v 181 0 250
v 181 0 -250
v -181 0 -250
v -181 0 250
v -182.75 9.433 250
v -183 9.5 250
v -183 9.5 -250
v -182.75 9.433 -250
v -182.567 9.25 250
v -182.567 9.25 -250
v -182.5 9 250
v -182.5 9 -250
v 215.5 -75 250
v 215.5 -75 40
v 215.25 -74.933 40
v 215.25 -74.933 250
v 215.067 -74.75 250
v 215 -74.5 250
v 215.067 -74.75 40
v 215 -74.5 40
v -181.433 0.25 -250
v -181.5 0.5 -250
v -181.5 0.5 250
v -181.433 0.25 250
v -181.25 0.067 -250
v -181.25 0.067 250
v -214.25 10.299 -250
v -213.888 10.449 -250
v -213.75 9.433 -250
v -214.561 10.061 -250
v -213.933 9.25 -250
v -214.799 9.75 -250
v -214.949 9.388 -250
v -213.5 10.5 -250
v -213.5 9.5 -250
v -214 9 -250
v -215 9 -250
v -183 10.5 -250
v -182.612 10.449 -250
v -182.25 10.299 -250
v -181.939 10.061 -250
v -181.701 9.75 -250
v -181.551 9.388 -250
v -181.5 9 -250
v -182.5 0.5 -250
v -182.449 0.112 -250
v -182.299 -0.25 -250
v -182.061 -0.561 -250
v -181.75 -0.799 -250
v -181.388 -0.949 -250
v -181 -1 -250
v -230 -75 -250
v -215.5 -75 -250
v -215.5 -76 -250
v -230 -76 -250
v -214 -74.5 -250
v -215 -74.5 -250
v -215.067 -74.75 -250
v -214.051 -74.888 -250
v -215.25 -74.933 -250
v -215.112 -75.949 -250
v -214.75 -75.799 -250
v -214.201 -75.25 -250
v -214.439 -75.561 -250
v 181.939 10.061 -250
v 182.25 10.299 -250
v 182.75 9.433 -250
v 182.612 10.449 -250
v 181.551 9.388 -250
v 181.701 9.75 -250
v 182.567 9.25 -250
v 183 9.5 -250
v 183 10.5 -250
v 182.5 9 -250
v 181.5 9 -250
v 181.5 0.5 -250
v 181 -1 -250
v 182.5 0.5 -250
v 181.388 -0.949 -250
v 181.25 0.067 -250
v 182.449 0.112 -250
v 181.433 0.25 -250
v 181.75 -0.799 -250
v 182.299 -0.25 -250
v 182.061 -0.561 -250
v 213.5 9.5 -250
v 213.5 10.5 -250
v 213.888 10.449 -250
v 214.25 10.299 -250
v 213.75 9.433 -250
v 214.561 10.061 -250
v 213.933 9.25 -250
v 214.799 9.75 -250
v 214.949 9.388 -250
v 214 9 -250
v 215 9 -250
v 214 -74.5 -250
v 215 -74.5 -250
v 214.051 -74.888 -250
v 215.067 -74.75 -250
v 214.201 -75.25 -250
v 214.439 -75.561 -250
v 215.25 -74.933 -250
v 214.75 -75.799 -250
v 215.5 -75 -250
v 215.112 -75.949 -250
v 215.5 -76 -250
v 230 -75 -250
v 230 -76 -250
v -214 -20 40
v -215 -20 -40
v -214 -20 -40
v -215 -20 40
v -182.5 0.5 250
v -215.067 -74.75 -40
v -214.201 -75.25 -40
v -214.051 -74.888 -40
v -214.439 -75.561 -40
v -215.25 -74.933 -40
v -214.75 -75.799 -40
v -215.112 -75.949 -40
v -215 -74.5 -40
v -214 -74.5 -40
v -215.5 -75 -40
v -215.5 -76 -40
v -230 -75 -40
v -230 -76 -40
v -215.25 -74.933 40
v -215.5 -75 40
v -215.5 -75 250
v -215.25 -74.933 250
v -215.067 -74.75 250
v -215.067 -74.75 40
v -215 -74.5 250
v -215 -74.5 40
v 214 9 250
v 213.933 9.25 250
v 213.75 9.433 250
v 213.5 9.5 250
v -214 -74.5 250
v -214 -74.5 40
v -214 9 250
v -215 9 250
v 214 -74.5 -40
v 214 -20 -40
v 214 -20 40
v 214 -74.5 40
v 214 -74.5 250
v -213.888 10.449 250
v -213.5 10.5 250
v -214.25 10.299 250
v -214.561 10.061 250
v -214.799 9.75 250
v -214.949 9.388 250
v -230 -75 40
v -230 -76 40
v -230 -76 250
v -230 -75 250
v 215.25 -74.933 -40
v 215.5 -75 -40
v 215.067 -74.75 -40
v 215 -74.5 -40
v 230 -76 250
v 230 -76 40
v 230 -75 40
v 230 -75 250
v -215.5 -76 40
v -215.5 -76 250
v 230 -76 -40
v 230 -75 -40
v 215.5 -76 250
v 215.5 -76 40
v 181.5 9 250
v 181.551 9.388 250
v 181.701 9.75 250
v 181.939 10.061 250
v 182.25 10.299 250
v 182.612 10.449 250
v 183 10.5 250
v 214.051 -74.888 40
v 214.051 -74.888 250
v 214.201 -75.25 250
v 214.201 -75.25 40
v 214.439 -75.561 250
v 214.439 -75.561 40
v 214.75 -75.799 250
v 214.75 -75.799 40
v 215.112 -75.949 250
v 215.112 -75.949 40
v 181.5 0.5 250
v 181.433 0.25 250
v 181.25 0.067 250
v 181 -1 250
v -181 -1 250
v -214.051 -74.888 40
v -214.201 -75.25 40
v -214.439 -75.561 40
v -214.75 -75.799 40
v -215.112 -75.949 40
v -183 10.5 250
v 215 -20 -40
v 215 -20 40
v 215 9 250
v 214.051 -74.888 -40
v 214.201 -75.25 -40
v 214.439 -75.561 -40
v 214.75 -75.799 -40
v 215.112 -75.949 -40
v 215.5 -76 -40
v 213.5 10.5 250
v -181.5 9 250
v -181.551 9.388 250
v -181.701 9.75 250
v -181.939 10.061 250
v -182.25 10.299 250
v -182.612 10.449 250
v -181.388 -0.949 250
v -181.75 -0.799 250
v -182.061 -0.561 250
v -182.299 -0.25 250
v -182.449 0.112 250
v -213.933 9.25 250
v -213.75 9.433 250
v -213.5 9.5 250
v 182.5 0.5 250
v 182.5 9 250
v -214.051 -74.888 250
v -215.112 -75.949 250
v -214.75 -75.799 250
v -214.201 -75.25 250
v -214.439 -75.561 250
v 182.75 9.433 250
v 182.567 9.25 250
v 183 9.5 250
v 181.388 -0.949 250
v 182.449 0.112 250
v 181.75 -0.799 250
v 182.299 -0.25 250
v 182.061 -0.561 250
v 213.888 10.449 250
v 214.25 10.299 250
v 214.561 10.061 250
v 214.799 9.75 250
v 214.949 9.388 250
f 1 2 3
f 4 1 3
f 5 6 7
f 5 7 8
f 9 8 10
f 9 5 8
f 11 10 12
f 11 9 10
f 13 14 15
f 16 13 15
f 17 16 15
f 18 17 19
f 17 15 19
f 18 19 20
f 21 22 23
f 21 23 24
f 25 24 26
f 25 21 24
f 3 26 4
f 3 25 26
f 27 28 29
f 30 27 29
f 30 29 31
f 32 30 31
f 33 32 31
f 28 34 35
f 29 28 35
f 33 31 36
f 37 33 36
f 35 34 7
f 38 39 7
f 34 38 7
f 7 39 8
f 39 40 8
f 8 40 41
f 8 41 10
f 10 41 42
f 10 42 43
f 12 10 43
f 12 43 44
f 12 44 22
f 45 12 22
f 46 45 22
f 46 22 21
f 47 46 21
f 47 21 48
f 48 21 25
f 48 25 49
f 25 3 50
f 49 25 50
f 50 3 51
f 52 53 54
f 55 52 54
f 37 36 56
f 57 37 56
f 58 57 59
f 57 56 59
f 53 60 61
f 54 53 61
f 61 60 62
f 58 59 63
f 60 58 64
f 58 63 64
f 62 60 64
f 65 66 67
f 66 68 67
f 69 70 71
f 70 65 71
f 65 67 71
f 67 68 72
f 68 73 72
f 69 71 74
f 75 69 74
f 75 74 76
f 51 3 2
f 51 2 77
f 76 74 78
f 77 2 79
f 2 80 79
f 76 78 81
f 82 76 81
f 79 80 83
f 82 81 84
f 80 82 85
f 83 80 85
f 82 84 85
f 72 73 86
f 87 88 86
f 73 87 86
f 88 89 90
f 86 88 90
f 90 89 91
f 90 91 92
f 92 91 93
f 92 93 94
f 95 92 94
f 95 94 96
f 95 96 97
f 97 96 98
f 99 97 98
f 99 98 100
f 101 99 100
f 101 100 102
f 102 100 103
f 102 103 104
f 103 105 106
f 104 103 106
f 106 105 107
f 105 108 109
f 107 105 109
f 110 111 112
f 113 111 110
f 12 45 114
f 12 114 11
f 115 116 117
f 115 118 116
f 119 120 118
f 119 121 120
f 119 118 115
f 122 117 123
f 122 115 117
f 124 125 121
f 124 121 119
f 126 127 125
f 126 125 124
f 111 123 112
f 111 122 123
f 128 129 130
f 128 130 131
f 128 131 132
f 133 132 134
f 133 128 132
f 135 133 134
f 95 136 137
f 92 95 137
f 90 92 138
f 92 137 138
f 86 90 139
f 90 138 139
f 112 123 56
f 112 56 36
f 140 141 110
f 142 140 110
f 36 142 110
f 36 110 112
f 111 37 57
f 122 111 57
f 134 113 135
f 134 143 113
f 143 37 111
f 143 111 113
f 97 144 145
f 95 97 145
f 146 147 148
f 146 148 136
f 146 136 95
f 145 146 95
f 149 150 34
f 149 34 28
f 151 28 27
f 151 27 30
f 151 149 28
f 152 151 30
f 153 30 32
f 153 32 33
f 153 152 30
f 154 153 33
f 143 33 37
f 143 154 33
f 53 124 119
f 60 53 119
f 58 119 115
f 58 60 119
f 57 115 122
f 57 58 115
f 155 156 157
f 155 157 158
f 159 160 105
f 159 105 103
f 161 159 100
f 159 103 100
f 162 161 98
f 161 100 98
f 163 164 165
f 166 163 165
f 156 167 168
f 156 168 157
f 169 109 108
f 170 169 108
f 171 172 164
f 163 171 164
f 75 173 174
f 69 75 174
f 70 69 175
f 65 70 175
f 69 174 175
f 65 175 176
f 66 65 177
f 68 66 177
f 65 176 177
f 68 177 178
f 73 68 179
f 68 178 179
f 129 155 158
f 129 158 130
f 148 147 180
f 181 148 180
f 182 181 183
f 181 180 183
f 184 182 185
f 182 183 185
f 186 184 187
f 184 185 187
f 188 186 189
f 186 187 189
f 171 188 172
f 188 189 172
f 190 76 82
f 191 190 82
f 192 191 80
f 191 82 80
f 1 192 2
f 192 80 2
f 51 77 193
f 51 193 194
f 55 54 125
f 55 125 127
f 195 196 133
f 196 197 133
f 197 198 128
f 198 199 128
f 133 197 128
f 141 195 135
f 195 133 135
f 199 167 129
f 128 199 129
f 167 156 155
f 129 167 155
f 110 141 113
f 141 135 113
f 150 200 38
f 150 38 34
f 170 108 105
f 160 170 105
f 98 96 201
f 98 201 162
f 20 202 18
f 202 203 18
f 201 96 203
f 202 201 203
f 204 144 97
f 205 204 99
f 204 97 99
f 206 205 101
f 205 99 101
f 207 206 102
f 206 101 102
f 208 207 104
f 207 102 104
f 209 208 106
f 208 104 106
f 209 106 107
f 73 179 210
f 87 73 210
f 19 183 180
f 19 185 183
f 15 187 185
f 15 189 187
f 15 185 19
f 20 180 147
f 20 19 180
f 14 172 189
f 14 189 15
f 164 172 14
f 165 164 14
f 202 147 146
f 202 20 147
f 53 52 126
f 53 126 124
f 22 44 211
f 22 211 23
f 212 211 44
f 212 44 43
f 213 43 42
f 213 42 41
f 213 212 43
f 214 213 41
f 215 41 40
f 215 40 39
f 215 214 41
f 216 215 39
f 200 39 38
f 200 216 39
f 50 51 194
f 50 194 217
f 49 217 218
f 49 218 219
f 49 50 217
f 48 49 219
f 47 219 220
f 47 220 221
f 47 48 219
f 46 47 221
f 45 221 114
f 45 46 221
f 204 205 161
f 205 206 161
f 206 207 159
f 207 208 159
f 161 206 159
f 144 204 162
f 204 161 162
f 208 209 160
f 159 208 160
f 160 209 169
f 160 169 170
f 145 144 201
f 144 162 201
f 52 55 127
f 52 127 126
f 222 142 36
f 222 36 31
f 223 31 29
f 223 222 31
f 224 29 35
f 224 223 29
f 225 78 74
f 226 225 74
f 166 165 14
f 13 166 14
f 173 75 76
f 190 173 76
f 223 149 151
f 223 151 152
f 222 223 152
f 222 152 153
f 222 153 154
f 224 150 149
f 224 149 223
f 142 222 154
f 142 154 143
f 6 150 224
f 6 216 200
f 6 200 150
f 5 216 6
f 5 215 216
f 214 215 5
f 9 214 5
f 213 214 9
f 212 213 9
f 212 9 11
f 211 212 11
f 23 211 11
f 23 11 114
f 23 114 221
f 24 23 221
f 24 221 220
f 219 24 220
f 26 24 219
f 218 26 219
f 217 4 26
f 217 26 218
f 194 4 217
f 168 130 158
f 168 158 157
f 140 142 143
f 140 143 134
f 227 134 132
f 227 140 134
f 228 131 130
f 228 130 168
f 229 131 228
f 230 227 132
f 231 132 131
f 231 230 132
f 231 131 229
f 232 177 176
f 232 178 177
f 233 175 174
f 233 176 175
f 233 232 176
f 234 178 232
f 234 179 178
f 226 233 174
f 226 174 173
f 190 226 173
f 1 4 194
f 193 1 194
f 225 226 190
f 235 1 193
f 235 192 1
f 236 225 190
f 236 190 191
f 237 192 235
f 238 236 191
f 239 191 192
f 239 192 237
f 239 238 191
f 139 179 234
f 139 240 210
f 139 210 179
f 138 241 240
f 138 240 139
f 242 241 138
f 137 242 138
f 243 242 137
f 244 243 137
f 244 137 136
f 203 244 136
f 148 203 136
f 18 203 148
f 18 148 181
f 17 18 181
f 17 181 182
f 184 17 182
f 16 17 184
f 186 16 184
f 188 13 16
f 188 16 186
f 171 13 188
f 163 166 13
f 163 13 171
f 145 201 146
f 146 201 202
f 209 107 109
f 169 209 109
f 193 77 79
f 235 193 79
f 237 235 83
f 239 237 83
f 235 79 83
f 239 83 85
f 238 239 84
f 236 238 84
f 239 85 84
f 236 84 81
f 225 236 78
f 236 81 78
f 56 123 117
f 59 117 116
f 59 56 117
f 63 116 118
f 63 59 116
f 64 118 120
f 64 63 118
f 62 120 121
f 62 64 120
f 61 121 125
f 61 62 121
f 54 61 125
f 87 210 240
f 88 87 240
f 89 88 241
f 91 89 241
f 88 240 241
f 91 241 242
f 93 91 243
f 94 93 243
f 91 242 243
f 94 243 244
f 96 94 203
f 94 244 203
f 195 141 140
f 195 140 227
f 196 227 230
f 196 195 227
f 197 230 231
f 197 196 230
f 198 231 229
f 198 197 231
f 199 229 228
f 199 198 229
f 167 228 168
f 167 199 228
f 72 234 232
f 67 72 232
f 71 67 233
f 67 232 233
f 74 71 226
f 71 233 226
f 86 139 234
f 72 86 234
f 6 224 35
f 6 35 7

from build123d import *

# Parameters (mm, degrees)
SKETCH_1_W             = 181
SKETCH_1_H             = 500
SM_BASE_FLANGE_1_DEPTH = 1
SM_EDGE_FLANGE_1_DEPTH = 500
SM_EDGE_FLANGE_2_DEPTH = 500
SM_EDGE_FLANGE_3_DEPTH = 500
SM_EDGE_FLANGE_4_DEPTH = 500
SKETCH_18_W            = 80
SKETCH_18_H            = 71.447403799
CUT_EXTRUDE_1_DEPTH    = 100


# Sheet-metal steps are written as plain solids
with BuildPart() as part:
    # Sketch 1 → 基体-法兰1 (new body)
    with BuildSketch(Plane(origin=(0, 0, 0), x_dir=(1, 0, 0), z_dir=(0, 1, 0))):
        with Locations((-90.5, 0)):
            Rectangle(SKETCH_1_W, SKETCH_1_H)
    extrude(amount=-SM_BASE_FLANGE_1_DEPTH)

    # 边线-法兰1 section (across the edge) → 边线-法兰1 (add)
    with BuildSketch(Plane(origin=(-181.5, 0, -250), x_dir=(1, 0, 0), z_dir=(0, 0, 1))):
        with BuildLine():
            Line((-1, 0.5), (-1, 9))
            Line((-1, 9), (0, 9))
            Line((0, 9), (0, 0.5))
            ThreePointArc((0, 0.5), (0.146446609, 0.146446609), (0.5, 0))
            Line((0.5, 0), (0.5, -1))
            ThreePointArc((0.5, -1), (-0.560660172, -0.560660172), (-1, 0.5))
        make_face()
    extrude(amount=SM_EDGE_FLANGE_1_DEPTH)

    # 边线-法兰2 section (across the edge) → 边线-法兰2 (add)
    with BuildSketch(Plane(origin=(-182.5, 9.5, 250), x_dir=(0, -1, 0), z_dir=(0, 0, -1))):
        with BuildLine():
            Line((-1, 0.5), (-1, 31))
            Line((-1, 31), (0, 31))
            Line((0, 31), (0, 0.5))
            ThreePointArc((0, 0.5), (0.146446609, 0.146446609), (0.5, 0))
            Line((0.5, 0), (0.5, -1))
            ThreePointArc((0.5, -1), (-0.560660172, -0.560660172), (-1, 0.5))
        make_face()
    extrude(amount=SM_EDGE_FLANGE_2_DEPTH)

    # 边线-法兰3 section (across the edge) → 边线-法兰3 (add)
    with BuildSketch(Plane(origin=(-214, 9.5, 250), x_dir=(1, 0, 0), z_dir=(0, 0, -1))):
        with BuildLine():
            Line((-1, 0.5), (-1, 84))
            Line((-1, 84), (0, 84))
            Line((0, 84), (0, 0.5))
            ThreePointArc((0, 0.5), (0.146446609, 0.146446609), (0.5, 0))
            Line((0.5, 0), (0.5, -1))
            ThreePointArc((0.5, -1), (-0.560660172, -0.560660172), (-1, 0.5))
        make_face()
    extrude(amount=SM_EDGE_FLANGE_3_DEPTH)

    # 边线-法兰4 section (across the edge) → 边线-法兰4 (add)
    with BuildSketch(Plane(origin=(-215, -75, -250), x_dir=(0, 1, 0), z_dir=(0, 0, 1))):
        with BuildLine():
            Line((-1, 0.5), (-1, 15))
            Line((-1, 15), (0, 15))
            Line((0, 15), (0, 0.5))
            ThreePointArc((0, 0.5), (0.146446609, 0.146446609), (0.5, 0))
            Line((0.5, 0), (0.5, -1))
            ThreePointArc((0.5, -1), (-0.560660172, -0.560660172), (-1, 0.5))
        make_face()
    extrude(amount=SM_EDGE_FLANGE_4_DEPTH)

    # 草图18 → 切除-拉伸1 (cut)
    with BuildSketch(Plane.ZY.offset(230)):
        with Locations((0, -55.723701899)):
            Rectangle(SKETCH_18_W, SKETCH_18_H)
    extrude(amount=-CUT_EXTRUDE_1_DEPTH, mode=Mode.SUBTRACT)

    # 镜向1: part across plane


with BuildPart() as part_1:
    add(part.part)
    add(part.part.mirror(Plane(origin=(0, -1, -250), x_dir=(0, 0, 1), z_dir=(1, 0, 0))))


solid = part_1.part
